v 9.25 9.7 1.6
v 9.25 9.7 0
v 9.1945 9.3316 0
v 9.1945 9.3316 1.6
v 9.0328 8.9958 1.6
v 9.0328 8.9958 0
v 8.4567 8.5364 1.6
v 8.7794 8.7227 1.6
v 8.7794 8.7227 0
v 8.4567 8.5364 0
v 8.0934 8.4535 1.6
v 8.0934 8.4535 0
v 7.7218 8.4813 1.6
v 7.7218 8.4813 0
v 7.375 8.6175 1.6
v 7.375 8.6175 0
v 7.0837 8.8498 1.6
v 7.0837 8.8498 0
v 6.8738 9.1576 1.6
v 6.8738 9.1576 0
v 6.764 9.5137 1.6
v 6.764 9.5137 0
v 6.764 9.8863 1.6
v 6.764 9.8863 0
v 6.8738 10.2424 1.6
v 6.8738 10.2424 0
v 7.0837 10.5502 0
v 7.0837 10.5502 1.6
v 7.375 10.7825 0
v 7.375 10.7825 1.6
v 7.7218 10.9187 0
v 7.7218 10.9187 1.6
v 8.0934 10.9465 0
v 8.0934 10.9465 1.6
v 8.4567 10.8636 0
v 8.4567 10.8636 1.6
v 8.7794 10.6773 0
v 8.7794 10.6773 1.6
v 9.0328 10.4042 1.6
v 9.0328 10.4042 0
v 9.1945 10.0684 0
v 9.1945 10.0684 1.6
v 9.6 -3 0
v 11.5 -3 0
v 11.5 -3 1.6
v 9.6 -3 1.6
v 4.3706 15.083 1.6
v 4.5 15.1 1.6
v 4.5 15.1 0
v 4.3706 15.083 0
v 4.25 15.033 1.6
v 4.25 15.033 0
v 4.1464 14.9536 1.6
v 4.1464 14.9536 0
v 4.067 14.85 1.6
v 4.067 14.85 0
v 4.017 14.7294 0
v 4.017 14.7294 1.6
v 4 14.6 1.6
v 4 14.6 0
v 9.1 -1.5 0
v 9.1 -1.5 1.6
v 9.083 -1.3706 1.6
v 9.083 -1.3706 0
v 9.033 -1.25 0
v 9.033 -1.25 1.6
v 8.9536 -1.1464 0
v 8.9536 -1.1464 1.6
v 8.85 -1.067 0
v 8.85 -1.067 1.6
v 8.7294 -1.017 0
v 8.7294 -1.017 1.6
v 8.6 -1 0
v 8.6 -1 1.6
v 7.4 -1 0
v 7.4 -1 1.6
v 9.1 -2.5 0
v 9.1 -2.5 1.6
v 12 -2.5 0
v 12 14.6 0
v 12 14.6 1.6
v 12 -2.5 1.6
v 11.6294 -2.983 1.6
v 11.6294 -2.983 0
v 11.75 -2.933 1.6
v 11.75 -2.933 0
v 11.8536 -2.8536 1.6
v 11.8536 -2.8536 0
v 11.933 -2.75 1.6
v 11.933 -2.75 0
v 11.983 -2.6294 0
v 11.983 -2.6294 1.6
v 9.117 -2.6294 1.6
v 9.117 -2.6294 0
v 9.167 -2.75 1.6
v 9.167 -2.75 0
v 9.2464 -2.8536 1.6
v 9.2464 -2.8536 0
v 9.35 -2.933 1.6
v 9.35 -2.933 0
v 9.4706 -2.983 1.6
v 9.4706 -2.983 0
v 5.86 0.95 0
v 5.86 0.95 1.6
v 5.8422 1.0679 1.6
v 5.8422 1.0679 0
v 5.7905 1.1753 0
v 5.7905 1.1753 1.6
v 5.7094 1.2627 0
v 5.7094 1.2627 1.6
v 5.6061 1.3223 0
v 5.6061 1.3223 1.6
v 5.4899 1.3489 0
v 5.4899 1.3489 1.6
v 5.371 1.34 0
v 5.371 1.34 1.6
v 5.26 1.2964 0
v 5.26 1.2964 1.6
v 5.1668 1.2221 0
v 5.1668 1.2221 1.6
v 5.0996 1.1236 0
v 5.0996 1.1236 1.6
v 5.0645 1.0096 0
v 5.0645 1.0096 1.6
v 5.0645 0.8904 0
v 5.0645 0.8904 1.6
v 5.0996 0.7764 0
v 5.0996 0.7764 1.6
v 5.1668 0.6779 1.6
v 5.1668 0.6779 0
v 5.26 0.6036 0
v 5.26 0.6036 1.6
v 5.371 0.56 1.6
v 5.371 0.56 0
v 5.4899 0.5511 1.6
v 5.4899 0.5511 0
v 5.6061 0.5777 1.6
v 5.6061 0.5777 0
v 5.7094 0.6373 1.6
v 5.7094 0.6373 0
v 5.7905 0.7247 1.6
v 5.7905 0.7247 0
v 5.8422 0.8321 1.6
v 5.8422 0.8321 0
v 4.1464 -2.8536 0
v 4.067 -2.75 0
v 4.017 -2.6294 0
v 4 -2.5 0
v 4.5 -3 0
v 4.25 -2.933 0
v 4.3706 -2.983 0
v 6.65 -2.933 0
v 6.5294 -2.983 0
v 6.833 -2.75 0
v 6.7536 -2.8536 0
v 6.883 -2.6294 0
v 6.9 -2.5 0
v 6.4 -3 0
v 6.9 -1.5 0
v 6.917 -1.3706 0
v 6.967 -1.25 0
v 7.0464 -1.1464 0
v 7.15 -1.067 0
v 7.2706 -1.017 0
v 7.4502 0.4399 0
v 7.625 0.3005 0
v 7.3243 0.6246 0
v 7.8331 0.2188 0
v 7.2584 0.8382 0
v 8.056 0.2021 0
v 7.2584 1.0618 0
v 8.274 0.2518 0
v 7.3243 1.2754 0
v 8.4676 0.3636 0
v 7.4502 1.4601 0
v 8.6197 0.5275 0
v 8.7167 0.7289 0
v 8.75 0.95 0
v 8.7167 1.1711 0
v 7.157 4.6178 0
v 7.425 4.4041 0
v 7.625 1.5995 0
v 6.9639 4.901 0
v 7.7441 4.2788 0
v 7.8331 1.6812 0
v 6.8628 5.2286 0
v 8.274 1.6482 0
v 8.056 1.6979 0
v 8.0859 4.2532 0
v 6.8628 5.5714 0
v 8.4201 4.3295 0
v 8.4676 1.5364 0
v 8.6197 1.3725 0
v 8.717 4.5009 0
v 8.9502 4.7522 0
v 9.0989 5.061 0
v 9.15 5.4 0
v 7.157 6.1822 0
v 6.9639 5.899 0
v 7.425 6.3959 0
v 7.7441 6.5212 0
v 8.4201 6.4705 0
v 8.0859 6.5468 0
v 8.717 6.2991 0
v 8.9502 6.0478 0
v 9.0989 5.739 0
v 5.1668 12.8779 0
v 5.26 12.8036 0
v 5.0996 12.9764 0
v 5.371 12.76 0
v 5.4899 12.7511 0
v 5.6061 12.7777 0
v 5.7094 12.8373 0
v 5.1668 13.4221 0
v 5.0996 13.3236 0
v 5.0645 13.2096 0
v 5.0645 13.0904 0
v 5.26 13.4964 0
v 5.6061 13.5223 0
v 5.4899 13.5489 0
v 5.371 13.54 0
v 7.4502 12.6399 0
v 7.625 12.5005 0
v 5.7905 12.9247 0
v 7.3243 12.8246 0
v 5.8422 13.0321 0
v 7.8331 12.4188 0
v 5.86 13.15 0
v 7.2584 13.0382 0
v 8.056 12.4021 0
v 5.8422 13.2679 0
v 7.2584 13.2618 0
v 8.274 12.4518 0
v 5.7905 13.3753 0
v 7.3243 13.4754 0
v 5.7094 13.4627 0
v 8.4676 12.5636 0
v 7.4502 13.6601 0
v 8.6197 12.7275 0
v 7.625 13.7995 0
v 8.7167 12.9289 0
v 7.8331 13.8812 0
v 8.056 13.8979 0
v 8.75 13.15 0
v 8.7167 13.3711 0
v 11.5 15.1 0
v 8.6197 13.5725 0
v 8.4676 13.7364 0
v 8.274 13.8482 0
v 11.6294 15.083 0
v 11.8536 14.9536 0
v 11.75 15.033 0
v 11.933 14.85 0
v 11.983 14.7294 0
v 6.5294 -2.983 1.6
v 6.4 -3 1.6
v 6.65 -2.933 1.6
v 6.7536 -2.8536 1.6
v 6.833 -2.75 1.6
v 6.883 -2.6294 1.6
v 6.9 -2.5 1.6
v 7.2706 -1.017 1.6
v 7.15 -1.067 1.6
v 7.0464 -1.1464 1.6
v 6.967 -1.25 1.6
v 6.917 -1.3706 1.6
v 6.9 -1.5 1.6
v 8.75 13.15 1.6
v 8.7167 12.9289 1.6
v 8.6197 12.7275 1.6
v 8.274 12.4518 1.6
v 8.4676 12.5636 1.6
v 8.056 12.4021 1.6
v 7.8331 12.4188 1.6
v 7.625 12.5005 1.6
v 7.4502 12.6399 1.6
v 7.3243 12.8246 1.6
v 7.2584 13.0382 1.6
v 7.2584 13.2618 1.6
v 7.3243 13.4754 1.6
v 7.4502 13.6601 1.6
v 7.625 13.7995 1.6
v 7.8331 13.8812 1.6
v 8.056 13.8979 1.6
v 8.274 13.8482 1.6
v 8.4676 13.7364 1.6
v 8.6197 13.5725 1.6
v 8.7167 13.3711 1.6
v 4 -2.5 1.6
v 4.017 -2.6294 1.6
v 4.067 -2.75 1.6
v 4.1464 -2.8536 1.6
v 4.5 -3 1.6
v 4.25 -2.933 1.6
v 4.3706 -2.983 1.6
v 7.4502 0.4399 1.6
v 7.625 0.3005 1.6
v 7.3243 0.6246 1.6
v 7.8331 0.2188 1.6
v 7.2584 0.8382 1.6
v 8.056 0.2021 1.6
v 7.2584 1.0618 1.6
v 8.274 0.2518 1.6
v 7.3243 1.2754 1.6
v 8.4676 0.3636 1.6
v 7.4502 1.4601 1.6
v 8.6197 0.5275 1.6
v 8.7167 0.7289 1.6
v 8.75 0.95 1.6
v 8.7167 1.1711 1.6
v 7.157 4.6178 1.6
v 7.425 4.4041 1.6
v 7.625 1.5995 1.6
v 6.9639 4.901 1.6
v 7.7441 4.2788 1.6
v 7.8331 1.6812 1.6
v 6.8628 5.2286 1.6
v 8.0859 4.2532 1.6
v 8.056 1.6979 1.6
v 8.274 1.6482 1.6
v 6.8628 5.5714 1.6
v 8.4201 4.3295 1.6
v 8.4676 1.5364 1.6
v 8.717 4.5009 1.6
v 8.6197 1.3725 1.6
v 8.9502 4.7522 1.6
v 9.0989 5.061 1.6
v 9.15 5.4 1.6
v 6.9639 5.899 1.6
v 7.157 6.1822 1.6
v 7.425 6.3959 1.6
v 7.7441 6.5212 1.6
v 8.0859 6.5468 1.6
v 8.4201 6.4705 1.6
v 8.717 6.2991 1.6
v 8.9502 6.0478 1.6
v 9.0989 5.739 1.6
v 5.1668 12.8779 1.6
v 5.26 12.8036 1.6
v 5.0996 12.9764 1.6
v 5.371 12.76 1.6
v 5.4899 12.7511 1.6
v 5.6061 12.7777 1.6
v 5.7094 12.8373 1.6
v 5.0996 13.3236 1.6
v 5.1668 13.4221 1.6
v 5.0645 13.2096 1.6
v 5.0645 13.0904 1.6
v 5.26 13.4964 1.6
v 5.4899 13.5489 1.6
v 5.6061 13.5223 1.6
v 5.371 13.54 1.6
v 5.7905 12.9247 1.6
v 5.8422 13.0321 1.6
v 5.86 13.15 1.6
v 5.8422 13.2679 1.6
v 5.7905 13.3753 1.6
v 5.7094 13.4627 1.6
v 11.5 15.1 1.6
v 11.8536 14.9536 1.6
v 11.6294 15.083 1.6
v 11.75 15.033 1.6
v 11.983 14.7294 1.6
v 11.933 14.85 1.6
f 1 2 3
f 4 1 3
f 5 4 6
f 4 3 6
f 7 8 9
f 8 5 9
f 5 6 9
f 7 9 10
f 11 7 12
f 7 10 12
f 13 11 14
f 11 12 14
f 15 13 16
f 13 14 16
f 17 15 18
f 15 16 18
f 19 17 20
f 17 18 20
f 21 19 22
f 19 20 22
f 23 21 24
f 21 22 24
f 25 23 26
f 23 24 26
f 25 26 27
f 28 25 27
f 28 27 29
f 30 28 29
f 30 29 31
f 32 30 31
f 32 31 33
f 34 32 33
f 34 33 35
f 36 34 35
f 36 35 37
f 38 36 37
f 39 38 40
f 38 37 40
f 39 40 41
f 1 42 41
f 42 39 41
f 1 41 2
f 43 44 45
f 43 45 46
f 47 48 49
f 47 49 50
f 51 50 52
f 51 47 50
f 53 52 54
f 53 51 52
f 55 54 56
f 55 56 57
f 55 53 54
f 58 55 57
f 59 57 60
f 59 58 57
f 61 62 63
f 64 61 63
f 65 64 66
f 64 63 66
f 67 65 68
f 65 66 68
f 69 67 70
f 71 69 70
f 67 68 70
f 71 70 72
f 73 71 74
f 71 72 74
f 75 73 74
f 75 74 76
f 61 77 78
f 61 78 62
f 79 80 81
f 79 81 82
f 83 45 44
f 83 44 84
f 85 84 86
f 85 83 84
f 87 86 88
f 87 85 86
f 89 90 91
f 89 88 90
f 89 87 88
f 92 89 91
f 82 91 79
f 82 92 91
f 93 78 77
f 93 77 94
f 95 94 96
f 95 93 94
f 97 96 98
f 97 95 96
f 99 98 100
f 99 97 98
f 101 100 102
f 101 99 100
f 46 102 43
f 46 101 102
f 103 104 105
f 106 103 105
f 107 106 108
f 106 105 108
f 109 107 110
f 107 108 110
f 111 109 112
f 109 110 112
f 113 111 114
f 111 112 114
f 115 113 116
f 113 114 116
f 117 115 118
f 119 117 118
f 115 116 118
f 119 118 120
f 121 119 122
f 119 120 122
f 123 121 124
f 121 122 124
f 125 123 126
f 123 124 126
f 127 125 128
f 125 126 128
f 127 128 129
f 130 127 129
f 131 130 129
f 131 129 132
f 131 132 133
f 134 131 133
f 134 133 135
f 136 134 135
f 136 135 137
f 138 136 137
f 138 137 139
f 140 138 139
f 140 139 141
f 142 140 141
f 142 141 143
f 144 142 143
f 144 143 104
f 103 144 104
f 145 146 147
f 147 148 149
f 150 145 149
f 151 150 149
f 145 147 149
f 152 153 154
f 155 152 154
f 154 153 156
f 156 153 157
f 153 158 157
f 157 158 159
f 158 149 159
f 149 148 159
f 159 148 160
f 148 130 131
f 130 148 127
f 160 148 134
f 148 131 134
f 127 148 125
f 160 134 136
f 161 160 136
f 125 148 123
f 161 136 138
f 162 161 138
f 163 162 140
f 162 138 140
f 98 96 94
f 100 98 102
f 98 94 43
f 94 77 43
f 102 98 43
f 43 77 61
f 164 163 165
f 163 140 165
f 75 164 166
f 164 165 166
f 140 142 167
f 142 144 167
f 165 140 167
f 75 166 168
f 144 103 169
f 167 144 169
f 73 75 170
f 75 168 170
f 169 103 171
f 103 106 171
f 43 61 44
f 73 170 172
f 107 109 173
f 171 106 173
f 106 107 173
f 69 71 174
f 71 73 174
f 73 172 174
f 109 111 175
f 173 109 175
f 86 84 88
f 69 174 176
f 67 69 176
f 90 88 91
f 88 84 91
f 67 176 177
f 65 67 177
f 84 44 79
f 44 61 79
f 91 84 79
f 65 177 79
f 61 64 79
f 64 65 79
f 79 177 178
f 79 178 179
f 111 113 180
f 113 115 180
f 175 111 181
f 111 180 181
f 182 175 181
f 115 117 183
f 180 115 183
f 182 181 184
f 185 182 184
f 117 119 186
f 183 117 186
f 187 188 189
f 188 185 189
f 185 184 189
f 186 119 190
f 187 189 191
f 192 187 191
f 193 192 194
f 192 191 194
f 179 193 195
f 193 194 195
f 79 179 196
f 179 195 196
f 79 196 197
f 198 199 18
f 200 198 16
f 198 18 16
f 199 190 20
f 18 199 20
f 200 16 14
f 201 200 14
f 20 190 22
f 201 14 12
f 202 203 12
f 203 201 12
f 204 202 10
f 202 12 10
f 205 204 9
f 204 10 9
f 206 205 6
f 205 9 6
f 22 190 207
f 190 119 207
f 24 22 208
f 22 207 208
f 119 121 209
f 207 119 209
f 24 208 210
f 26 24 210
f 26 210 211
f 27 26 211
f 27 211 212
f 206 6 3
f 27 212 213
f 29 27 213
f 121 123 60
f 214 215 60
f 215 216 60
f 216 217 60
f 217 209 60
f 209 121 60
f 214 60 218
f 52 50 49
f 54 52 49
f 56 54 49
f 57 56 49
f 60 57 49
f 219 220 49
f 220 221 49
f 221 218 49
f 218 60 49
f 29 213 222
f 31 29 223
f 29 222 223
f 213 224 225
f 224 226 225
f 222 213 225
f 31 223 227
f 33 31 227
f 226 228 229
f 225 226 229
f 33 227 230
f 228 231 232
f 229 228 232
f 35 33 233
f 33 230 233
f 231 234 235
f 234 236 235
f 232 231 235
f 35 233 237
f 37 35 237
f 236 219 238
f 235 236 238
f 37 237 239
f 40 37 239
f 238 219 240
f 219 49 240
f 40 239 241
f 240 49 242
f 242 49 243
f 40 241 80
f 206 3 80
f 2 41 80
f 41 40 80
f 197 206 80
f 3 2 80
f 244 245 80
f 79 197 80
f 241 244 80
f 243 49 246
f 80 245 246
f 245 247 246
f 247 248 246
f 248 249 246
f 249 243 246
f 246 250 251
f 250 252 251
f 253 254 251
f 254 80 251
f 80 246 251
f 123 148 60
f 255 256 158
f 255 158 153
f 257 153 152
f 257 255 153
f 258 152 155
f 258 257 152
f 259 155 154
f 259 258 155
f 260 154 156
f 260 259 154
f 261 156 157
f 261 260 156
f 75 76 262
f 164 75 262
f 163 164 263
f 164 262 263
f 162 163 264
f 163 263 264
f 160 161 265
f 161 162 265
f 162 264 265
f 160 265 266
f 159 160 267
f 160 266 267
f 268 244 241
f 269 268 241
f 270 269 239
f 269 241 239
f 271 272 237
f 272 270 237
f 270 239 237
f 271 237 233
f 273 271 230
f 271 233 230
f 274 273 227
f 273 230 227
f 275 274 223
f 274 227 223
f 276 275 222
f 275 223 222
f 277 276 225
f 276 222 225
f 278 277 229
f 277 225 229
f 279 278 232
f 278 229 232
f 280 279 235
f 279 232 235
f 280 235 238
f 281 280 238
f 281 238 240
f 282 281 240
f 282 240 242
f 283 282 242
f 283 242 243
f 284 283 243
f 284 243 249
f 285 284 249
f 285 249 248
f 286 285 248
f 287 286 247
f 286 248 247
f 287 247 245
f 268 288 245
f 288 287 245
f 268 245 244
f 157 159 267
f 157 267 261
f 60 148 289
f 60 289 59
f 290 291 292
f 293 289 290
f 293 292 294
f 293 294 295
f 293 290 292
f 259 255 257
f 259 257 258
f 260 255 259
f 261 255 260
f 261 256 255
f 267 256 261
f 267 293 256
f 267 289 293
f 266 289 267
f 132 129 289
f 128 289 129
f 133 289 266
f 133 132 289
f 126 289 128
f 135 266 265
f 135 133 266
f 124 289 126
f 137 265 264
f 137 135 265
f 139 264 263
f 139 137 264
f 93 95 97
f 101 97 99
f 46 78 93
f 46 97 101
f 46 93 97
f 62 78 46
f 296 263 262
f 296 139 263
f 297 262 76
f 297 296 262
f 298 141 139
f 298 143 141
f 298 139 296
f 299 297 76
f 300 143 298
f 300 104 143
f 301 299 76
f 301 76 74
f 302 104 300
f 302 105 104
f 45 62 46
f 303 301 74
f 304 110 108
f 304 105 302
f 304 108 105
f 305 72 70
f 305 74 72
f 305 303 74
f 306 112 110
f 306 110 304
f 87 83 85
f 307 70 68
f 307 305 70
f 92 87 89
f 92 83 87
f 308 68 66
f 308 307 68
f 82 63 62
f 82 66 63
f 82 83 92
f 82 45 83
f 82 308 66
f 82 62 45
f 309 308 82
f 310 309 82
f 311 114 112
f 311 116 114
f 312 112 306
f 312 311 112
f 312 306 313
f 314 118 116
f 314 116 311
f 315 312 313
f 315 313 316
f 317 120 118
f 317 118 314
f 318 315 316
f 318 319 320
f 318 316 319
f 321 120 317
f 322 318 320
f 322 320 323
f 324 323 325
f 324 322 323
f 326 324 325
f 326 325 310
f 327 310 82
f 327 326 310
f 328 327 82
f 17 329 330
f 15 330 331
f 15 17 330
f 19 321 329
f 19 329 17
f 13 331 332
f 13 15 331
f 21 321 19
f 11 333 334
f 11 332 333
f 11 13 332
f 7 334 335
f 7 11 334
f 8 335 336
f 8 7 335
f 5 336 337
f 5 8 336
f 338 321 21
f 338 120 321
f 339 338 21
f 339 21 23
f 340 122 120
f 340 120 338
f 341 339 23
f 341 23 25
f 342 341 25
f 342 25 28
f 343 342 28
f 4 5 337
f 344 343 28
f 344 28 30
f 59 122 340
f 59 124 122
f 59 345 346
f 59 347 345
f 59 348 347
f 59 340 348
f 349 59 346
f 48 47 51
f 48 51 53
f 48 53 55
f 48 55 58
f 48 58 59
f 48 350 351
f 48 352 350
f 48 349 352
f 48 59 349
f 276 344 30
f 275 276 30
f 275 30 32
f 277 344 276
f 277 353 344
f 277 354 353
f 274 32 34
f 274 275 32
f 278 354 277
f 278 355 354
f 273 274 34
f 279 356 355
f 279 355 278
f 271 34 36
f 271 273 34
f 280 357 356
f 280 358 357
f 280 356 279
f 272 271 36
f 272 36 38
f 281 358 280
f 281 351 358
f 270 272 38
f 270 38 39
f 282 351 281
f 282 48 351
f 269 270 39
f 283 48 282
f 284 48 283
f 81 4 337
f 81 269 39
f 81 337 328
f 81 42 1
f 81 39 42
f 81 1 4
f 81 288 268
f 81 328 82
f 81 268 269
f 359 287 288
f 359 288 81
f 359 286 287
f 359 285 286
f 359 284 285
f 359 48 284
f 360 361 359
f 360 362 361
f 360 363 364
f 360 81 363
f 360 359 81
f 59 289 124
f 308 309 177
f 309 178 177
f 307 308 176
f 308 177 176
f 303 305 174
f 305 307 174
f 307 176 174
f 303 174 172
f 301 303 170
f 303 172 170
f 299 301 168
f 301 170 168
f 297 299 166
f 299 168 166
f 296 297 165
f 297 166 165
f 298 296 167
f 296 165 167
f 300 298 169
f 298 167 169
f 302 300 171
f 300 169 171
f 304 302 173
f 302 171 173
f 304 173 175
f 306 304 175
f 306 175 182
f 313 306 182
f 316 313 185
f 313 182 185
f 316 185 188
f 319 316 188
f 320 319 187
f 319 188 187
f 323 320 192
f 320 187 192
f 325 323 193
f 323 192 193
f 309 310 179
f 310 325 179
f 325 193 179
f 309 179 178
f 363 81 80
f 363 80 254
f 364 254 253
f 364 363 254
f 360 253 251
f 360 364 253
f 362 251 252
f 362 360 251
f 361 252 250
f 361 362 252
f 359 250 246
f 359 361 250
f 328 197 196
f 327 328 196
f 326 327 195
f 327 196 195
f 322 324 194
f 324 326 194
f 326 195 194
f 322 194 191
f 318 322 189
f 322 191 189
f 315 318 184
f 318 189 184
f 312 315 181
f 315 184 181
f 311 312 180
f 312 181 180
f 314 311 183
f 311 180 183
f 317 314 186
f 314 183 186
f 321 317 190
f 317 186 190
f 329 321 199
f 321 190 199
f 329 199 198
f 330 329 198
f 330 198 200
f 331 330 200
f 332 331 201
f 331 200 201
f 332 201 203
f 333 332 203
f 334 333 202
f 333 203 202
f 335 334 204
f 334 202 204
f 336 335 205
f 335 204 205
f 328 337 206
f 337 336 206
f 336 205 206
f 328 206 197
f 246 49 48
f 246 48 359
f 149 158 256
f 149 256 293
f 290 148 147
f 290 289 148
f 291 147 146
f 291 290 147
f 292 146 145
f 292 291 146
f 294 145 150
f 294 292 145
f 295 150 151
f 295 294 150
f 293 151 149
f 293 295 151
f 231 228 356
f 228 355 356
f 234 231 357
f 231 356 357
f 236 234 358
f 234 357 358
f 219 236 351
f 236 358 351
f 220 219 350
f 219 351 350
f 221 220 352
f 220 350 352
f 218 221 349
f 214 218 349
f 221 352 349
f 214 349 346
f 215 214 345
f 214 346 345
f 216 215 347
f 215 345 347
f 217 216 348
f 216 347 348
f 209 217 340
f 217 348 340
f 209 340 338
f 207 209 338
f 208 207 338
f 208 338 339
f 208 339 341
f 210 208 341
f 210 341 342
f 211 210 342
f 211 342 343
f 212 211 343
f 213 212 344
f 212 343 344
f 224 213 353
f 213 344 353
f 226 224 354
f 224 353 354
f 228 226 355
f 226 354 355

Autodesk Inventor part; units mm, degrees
ref_plane "YZ Plane" through (0, 0, 0) normal (1, 0, 0) x (0, 1, 0)
ref_plane "XZ Plane" through (0, 0, 0) normal (0, 1, 0) x (-1, 0, 0)
ref_plane "XY Plane" through (0, 0, 0) normal (0, 0, 1) x (1, 0, 0)
sketch "スケッチ1" plane through (0, 0, 0) normal (0, 0, 1) x (1, 0, 0)
  line L0 (4, 15.1) -> (12, 15.1)
  line L1 (12, 15.1) -> (12, -3)
  line L2 (4, -3) -> (4, 15.1)
  circle A0 centre (8, 9.7) radius 1.25 projected
  circle A1 centre (50, 5.4) radius 1.15 projected
  circle A2 centre (8, -5.4) radius 1.15 projected
  circle A3 centre (50, -5.4) radius 1.15 projected
  circle A4 centre (8, 5.4) radius 1.15 projected
  line L3 (-1, 21.7) -> (66, 21.7) projected
  line L4 (-2, 20.7) -> (-2, -20.7) projected
  line L5 (66, -21.7) -> (-1, -21.7) projected
  circle A5 centre (8, 13.15) radius 0.75
  circle A6 centre (8, 0.95) radius 0.75
  line L6 (6.8, 15.1) -> (9.4, 15.1)
  line L7 (9.1, -3) -> (9.1, -1)
  line L8 (9.1, -1) -> (6.9, -1)
  line L9 (6.9, -1) -> (6.9, -3)
  circle A7 centre (8, -5.4) radius 2
  line L10 (12, -3) -> (9.1, -3)
  line L11 (6.9, -3) -> (4, -3)
  line L12 (49.4, 10.95) -> (50.6, 10.95) projected
  arc A8 (51.5, 10.05) -> (50.6, 10.95) centre (50.6, 10.05) ccw projected
  line L13 (50.6, 8.45) -> (49.4, 8.45) projected
  arc A9 (48.5, 9.35) -> (49.4, 8.45) centre (49.4, 9.35) ccw projected
  arc A10 (66, -21.7) -> (67, -20.7) centre (66, -20.7) ccw projected
  arc A11 (67, 20.7) -> (66, 21.7) centre (66, 20.7) ccw projected
  arc A12 (-1, 21.7) -> (-2, 20.7) centre (-1, 20.7) ccw projected
  arc A13 (-2, -20.7) -> (-1, -21.7) centre (-1, -20.7) ccw projected
  line L14 (9.5, -0.55) -> (3.96, -0.55) projected
  line L15 (3.96, -0.55) -> (3.96, 2.45) projected
  line L16 (3.96, 2.45) -> (9.5, 2.45) projected
  line L17 (9.5, 2.45) -> (9.5, -0.55) projected
  line L18 (9.5, 11.65) -> (3.96, 11.65) projected
  line L19 (3.96, 11.65) -> (3.96, 14.65) projected
  line L20 (3.96, 14.65) -> (9.5, 14.65) projected
  line L21 (9.5, 14.65) -> (9.5, 11.65) projected
  line L22 (54, 9) -> (67, 9) projected
  line L23 (67, 20.7) -> (67, 9) projected
  line L24 (67, -7.5) -> (67, -20.7) projected
  line L25 (67, -7.5) -> (54, -7.5) projected
  line L26 (54, -7.5) -> (54, 9) projected
  line L27 (51.5, 10.05) -> (51.5, 9.35) projected
  arc A14 (50.6, 8.45) -> (51.5, 9.35) centre (50.6, 9.35) ccw projected
  line L28 (48.5, 9.35) -> (48.5, 10.05) projected
  arc A15 (49.4, 10.95) -> (48.5, 10.05) centre (49.4, 10.05) ccw projected
  point P0 (0, 0)
  point P1 (8, -2.2)
  dimension "d6" = 8
  dimension "d7" = 1.5
  dimension "d8" = 1.5
  dimension "d22" = 4
  dimension "d24" = 1.2
  dimension "d25" = 11.9
  dimension "d27" = 3
  dimension "d32" = 1.1
  dimension "d33" = 1.1
  dimension "d35" = 4.3
  dimension "d36" = 3.45
  dimension "d37" = 8.75
  dimension "d38" = 4.45
extrude "押し出し1" add sketch "スケッチ1" along normal blind 1.6 contours L0 L1 L10 L7 L8 L9 L11 L2 L14 L17 L16 L18 L21 L20 | L20 L21 L18 L2 | L16 L17 L14 L2
sketch "スケッチ2" plane through (0, 0, 1.6) normal (0, 0, 1) x (1, 0, 0)
  circle A0 centre (8, 13.15) radius 0.75 projected
  circle A1 centre (8, 0.95) radius 0.75 projected
  circle A2 centre (8, 9.7) radius 1.25 projected
  circle A3 centre (8, 5.4) radius 1.15 projected
  line L0 (12, 15.1) -> (4, 15.1) projected
  line L1 (4, 15.1) -> (4, -3) projected
  line L2 (9.1, -3) -> (12, -3) projected
  line L3 (12, -3) -> (12, 15.1) projected
  circle A4 centre (5.46, 13.15) radius 0.4
  circle A5 centre (5.46, 0.95) radius 0.4
  line L4 (4, -3) -> (6.9, -3) projected
  line L5 (6.9, -3) -> (6.9, -1) projected
  line L6 (6.9, -1) -> (9.1, -1) projected
  line L7 (9.1, -1) -> (9.1, -3) projected
  point P0 (0, 0)
  dimension "d11" = 0.8
  dimension "d12" = 0.8
  dimension "d13" = 2.54
  dimension "d14" = 2.54
extrude "押し出し2" cut sketch "スケッチ2" against normal through all contours A4 | A5
fillet "フィレット1" radius 0.5 8 edges at (4, 15.1, 0.8) (4, -3, 0.8) (6.9, -3, 0.8) (6.9, -1, 0.8) (9.1, -1, 0.8) (9.1, -3, 0.8) (12, -3, 0.8) (12, 15.1, 0.8)
properties part number "HbBatteryPcb01"
